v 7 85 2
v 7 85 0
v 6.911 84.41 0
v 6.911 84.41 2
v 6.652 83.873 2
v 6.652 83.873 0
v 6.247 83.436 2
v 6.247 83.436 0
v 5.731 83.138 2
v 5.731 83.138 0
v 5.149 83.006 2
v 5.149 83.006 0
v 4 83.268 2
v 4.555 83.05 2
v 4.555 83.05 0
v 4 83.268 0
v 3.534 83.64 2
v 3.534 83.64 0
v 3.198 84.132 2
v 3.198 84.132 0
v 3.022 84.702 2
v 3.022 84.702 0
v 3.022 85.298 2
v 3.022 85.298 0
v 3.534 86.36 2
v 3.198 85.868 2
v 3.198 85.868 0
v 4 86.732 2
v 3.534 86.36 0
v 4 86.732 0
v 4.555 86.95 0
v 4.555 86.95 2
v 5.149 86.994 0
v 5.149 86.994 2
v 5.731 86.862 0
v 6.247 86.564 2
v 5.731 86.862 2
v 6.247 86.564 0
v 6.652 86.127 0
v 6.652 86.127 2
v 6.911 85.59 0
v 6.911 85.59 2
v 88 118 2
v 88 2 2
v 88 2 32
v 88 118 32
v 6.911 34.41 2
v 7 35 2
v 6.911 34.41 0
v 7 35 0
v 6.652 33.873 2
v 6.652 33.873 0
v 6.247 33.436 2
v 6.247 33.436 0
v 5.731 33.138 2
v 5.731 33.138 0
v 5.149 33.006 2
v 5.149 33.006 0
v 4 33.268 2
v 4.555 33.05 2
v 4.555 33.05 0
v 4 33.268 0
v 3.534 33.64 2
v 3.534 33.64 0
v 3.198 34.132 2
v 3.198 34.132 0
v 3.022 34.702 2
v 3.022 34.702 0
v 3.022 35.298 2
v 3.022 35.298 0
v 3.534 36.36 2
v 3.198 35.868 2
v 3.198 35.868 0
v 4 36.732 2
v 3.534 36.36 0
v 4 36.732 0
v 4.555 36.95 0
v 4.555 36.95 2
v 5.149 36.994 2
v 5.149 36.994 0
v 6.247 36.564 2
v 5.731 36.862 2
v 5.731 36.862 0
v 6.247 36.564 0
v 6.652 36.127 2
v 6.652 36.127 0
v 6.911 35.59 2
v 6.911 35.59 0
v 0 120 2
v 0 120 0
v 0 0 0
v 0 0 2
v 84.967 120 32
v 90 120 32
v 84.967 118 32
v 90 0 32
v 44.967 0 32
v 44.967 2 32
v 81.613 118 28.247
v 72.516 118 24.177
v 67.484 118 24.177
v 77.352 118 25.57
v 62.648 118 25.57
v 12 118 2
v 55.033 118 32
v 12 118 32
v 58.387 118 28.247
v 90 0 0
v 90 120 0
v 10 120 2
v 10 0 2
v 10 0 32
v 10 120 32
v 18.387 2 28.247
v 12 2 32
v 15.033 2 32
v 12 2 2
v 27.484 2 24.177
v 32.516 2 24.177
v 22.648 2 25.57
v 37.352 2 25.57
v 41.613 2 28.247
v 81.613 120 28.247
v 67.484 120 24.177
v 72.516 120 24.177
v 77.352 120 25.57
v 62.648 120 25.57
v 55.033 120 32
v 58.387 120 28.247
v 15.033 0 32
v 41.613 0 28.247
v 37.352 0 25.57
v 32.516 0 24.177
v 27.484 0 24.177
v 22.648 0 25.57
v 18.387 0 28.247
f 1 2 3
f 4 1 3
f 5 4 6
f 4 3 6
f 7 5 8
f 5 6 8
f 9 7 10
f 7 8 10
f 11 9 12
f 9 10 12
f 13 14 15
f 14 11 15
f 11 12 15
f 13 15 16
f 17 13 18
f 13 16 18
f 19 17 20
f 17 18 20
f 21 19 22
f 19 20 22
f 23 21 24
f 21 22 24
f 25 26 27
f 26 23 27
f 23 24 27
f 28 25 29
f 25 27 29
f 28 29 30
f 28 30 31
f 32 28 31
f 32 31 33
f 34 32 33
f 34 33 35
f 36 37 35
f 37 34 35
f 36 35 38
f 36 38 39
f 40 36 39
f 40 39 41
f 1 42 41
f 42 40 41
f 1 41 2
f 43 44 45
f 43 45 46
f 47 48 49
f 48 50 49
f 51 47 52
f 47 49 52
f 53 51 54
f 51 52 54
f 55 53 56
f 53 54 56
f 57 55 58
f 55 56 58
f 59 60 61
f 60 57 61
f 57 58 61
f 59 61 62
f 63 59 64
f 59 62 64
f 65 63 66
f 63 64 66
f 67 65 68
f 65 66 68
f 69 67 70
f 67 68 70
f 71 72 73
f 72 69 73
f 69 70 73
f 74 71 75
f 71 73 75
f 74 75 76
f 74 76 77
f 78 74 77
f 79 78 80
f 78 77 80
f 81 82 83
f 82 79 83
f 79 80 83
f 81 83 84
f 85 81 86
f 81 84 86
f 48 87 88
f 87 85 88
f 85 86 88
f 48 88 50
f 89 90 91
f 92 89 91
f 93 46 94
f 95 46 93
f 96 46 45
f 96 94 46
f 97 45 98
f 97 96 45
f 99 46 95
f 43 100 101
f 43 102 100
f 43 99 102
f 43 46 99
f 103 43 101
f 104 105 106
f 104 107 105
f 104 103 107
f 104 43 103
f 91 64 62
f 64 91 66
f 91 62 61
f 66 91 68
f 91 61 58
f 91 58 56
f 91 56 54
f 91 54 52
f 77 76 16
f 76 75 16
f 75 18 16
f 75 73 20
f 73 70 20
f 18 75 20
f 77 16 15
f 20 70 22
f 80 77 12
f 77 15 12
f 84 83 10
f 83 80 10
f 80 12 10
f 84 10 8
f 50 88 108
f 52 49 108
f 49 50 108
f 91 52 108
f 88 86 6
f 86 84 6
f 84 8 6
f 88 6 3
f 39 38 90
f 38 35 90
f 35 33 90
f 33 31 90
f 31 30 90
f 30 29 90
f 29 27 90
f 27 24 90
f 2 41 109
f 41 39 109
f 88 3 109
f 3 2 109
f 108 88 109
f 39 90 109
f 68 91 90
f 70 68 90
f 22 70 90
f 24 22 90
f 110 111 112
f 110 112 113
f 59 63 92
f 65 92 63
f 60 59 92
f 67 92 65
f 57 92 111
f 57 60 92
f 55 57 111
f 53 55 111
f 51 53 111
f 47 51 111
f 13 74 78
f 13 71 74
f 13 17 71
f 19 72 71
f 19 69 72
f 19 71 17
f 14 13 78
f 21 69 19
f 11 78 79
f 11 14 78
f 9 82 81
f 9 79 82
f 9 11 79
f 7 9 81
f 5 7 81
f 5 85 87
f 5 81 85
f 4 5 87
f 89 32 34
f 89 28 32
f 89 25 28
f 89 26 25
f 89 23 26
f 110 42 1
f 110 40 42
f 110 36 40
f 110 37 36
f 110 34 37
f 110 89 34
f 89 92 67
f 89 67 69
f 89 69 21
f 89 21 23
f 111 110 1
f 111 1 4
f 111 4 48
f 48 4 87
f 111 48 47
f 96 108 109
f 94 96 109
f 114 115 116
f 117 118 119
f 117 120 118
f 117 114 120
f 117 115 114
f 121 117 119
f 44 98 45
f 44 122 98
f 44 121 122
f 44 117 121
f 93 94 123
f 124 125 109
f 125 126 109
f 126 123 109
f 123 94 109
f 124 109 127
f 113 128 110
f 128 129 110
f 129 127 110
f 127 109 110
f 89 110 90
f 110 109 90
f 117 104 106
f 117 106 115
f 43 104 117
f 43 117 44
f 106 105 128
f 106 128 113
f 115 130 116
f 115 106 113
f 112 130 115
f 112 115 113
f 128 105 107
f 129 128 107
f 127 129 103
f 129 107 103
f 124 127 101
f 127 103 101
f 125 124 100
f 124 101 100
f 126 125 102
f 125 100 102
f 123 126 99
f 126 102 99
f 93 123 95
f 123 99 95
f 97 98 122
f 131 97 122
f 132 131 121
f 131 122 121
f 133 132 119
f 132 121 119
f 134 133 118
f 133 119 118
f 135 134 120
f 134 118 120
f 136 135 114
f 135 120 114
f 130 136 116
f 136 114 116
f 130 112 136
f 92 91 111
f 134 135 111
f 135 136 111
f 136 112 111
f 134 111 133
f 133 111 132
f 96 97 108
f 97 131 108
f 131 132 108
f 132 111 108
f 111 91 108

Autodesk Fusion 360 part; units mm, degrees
sketch "Sketch1" plane through (0, 0, 0) normal (0, 0, 1) x (1, 0, 0)
  line L0 (0, 0) -> (90, 0)
  line L1 (90, 0) -> (90, 120)
  line L2 (90, 120) -> (0, 120)
  line L3 (0, 120) -> (0, 0)
  circle A0 centre (5, 35) radius 2
  circle A1 centre (5, 85) radius 2
  dimension "d1" = 90
  dimension "d2" = 120
  dimension "d4" = 4
  dimension "d9" = 35
  dimension "d10" = 5
  dimension "d43" = 0
  dimension "d44" = 50
extrude "Extrude1" add sketch "Sketch1" along normal blind 2
sketch "Sketch2" plane through (0, 0, 2) normal (0, 0, 1) x (-1, 0, 0)
  circle A0 centre (-5, -35) radius 2
  line L0 (0, -120) -> (0, 0)
  line L1 (0, 0) -> (-90, 0)
  line L2 (-90, 0) -> (-90, -120)
  line L3 (-90, -120) -> (0, -120)
  line L4 (-90, 0) -> (-10, 0)
  line L5 (-10, 0) -> (-10, -120)
  line L6 (-10, -120) -> (-90, -120)
  line L7 (-90, -120) -> (-90, 0)
  line L8 (-10, -120) -> (-90, -120)
  line L9 (-90, -120) -> (-90, -118)
  line L10 (-90, -118) -> (-10, -118)
  line L11 (-10, -118) -> (-10, -120)
  line L12 (-10, -120) -> (-12, -120)
  line L13 (-12, -120) -> (-12, 0)
  line L14 (-12, 0) -> (-10, 0)
  line L15 (-10, 0) -> (-10, -120)
  line L16 (-90, 0) -> (-10, 0)
  line L17 (-10, 0) -> (-10, -2)
  line L18 (-10, -2) -> (-90, -2)
  line L19 (-90, -2) -> (-90, 0)
  line L20 (-90, 0) -> (-88, 0)
  line L21 (-88, 0) -> (-88, -120)
  line L22 (-88, -120) -> (-90, -120)
  line L23 (-90, -120) -> (-90, 0)
  circle A1 centre (-5, -85) radius 2
  dimension "d13" = 2
  dimension "d14" = 2
  dimension "d15" = 120
  dimension "d16" = 2
  dimension "d17" = 2
extrude "Extrude2" add sketch "Sketch2" along normal blind 30 contours L3 L5 L6 L8 L10 L11 L12 L13 L15 | L1 L4 L5 L13 L14 L15 L16 L17 L18 | L3 L6 L8 L10 L13 L21 | L5 L10 L13 L15 L18 | L1 L4 L13 L16 L18 L21 | L2 L3 L6 L7 L8 L9 L10 L21 L22 L23 | L1 L2 L4 L7 L16 L18 L19 L20 L21 L23 | L2 L7 L10 L18 L21 L23
sketch "Sketch3" plane through (0, 120, 0) normal (0, 1, 0) x (-1, 0, 0)
  line L0 (-90, 0) -> (0, 0)
  line L1 (0, 0) -> (0, 2)
  line L2 (0, 2) -> (-10, 2)
  line L3 (-10, 2) -> (-10, 32)
  line L4 (-10, 32) -> (-90, 32)
  line L5 (-90, 32) -> (-90, 0)
  circle A0 centre (-70, 42) radius 18
  line L6 (-88, 2) -> (-88, 32)
  dimension "d20" = 36
  dimension "d26" = 18
  dimension "d39" = 42
sketch "Sketch4" plane through (0, 0, 0) normal (0, -1, 0) x (1, 0, 0)
  line L0 (0, 0) -> (90, 0)
  line L1 (90, 0) -> (90, 32)
  line L2 (90, 32) -> (10, 32)
  line L3 (10, 32) -> (10, 2)
  line L4 (10, 2) -> (0, 2)
  line L5 (0, 2) -> (0, 0)
  circle A0 centre (30, 42) radius 18
  line L6 (12, 2) -> (12, 32)
  dimension "d28" = 36
  dimension "d29" = 18
  dimension "d40" = 42
hole "Hole1" at (30, 0, 42) direction (0, 1, 0) diameter 36 depth 4 tip angle 180
hole "Hole2" at (70, 120, 42) direction (0, -1, 0) diameter 36 depth 20 tip angle 118
